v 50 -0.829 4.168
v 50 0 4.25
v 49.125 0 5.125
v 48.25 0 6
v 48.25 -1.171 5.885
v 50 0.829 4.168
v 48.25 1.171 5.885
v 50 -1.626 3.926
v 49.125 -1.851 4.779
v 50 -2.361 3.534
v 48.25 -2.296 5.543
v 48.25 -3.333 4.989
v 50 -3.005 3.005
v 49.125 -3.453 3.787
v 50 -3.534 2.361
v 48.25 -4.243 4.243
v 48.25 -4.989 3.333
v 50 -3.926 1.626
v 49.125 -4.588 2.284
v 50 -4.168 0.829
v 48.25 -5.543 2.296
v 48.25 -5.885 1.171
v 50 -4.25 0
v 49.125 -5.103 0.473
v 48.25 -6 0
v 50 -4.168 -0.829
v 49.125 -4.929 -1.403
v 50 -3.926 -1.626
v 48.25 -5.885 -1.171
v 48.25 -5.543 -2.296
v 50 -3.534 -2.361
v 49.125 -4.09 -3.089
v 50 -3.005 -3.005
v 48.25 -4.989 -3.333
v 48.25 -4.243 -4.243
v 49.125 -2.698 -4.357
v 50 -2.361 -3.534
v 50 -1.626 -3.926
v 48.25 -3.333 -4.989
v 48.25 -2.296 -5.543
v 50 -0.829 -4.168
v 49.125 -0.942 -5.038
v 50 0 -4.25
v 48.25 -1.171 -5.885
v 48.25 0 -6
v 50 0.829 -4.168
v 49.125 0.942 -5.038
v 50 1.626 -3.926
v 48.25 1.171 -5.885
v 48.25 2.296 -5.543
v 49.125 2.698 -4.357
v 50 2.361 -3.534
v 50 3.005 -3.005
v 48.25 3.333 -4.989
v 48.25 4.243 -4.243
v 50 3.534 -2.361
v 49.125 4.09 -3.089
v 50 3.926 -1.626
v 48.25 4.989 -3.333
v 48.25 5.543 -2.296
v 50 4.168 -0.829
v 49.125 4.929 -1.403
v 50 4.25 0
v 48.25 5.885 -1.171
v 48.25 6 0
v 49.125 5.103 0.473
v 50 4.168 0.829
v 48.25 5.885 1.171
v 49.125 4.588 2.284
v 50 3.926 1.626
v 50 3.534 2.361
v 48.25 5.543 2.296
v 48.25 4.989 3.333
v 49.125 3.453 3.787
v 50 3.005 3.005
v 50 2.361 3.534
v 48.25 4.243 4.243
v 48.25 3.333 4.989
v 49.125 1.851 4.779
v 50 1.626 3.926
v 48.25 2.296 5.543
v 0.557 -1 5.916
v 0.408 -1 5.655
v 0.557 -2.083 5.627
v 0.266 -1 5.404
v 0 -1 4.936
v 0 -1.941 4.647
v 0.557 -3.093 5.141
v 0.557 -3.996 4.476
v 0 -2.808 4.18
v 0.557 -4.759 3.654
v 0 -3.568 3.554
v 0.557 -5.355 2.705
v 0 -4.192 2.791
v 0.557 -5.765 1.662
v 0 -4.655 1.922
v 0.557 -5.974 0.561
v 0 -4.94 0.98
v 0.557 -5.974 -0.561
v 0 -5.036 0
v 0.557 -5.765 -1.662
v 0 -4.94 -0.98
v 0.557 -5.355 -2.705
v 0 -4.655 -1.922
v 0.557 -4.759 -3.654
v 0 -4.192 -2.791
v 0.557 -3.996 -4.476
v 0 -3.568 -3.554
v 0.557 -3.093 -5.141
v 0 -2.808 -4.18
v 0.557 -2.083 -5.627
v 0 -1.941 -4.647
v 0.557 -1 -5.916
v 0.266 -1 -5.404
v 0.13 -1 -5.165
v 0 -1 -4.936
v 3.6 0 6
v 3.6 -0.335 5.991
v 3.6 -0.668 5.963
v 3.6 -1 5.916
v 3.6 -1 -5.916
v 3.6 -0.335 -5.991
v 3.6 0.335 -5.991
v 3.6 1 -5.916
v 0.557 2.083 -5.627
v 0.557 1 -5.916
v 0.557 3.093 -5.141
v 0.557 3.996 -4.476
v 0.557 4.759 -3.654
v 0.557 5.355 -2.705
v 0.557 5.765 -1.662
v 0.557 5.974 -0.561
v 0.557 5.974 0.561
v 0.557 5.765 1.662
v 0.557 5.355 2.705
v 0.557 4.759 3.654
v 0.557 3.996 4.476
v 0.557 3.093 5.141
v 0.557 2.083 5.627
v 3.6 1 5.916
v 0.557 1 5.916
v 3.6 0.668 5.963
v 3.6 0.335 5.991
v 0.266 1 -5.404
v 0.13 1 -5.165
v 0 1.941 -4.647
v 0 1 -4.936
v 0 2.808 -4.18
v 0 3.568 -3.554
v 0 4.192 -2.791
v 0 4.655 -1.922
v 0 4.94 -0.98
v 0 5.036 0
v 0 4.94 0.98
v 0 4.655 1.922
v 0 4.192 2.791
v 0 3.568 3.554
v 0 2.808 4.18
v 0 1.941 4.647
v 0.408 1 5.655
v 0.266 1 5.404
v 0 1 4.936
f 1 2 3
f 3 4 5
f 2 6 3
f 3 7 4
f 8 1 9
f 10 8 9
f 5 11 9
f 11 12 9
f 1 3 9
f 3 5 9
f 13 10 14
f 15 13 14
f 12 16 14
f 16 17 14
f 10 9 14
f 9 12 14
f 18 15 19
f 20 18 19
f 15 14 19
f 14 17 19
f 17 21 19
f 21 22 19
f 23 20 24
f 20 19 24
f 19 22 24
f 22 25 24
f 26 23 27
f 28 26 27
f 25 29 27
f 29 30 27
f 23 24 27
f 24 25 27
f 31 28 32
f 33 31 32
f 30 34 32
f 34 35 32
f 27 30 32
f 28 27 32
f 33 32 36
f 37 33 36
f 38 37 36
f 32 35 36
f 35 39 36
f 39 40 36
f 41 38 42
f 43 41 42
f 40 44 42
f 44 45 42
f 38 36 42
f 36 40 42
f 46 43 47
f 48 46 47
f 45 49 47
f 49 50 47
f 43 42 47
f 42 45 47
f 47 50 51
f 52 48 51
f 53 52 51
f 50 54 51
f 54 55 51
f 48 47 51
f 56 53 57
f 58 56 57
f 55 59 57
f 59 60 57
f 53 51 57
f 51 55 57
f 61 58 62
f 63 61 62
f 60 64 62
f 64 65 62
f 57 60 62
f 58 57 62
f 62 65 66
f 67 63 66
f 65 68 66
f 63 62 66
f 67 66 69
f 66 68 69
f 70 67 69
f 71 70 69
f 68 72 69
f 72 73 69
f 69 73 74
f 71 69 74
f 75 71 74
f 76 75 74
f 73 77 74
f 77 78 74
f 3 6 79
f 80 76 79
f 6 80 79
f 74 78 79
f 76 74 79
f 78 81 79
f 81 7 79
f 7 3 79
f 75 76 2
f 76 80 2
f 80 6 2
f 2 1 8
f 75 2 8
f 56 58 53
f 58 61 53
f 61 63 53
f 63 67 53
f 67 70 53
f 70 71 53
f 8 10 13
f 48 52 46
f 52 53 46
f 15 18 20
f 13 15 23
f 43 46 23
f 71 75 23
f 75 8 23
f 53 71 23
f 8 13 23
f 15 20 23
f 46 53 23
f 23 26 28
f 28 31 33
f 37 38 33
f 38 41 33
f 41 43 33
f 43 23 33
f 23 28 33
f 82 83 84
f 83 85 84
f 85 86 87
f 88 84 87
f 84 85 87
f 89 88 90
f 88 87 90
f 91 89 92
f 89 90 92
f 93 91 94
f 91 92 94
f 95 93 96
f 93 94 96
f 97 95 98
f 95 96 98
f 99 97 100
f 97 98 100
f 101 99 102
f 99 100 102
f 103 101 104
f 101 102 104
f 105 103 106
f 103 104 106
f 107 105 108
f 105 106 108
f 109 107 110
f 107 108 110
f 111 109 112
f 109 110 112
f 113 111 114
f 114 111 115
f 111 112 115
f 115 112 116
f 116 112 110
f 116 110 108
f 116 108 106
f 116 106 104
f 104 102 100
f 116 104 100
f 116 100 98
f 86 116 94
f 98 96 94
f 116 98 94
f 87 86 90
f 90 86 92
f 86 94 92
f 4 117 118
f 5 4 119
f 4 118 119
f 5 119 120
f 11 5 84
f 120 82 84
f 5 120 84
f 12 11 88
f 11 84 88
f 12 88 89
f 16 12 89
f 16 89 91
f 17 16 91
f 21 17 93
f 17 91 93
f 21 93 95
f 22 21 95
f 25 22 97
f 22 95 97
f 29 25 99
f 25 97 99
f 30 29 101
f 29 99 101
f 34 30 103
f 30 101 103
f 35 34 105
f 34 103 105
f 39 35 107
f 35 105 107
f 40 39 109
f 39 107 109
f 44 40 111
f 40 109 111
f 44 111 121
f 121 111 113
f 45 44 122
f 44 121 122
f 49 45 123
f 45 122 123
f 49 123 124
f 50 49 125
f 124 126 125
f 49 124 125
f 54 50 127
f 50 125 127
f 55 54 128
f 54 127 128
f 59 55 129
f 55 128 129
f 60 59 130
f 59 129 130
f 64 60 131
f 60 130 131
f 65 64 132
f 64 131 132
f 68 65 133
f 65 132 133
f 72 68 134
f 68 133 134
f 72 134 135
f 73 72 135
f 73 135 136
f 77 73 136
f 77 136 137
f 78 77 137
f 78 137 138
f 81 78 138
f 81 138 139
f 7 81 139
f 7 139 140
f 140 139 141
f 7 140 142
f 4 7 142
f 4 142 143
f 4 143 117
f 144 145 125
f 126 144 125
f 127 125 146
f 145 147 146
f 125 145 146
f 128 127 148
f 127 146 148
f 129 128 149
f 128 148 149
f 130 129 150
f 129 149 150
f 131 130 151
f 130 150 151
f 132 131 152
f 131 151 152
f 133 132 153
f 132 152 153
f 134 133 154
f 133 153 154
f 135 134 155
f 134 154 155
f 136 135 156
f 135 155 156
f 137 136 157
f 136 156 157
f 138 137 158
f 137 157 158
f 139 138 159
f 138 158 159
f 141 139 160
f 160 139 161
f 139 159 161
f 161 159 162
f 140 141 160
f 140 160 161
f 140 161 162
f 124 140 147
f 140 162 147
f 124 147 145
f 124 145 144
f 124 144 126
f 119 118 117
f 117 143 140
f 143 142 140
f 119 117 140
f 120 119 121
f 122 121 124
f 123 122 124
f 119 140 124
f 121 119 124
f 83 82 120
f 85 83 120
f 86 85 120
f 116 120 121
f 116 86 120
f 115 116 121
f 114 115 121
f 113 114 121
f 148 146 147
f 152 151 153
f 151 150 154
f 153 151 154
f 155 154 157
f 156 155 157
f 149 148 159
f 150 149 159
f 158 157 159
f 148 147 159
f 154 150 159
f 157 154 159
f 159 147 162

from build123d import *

# Parameters (mm, degrees)
SKETCH2_W  = 12
SKETCH2_H  = 2
SLOT_DEPTH = 3.6


with BuildPart() as part:
    # BodySke → BaseBody (revolve)
    with BuildSketch(Plane.XY, mode=Mode.PRIVATE) as basebody_sk:
        Polygon((50, 0), (50, 4.25), (48.25, 6), (0.556565659, 6), (0, 5.036), (0, 0), align=None)
    revolve(basebody_sk.sketch.rotate(Axis((50, 0, 0), (1, 0, 0)), 90), axis=Axis((50, 0, 0), (1, 0, 0)))

    # Sketch2 → Slot (cut)
    with BuildSketch(Plane(origin=(0, 0, 0), x_dir=(0, 0, -1), z_dir=(1, 0, 0))):
        Rectangle(SKETCH2_W, SKETCH2_H)
    extrude(amount=SLOT_DEPTH, mode=Mode.SUBTRACT)


solid = part.part
